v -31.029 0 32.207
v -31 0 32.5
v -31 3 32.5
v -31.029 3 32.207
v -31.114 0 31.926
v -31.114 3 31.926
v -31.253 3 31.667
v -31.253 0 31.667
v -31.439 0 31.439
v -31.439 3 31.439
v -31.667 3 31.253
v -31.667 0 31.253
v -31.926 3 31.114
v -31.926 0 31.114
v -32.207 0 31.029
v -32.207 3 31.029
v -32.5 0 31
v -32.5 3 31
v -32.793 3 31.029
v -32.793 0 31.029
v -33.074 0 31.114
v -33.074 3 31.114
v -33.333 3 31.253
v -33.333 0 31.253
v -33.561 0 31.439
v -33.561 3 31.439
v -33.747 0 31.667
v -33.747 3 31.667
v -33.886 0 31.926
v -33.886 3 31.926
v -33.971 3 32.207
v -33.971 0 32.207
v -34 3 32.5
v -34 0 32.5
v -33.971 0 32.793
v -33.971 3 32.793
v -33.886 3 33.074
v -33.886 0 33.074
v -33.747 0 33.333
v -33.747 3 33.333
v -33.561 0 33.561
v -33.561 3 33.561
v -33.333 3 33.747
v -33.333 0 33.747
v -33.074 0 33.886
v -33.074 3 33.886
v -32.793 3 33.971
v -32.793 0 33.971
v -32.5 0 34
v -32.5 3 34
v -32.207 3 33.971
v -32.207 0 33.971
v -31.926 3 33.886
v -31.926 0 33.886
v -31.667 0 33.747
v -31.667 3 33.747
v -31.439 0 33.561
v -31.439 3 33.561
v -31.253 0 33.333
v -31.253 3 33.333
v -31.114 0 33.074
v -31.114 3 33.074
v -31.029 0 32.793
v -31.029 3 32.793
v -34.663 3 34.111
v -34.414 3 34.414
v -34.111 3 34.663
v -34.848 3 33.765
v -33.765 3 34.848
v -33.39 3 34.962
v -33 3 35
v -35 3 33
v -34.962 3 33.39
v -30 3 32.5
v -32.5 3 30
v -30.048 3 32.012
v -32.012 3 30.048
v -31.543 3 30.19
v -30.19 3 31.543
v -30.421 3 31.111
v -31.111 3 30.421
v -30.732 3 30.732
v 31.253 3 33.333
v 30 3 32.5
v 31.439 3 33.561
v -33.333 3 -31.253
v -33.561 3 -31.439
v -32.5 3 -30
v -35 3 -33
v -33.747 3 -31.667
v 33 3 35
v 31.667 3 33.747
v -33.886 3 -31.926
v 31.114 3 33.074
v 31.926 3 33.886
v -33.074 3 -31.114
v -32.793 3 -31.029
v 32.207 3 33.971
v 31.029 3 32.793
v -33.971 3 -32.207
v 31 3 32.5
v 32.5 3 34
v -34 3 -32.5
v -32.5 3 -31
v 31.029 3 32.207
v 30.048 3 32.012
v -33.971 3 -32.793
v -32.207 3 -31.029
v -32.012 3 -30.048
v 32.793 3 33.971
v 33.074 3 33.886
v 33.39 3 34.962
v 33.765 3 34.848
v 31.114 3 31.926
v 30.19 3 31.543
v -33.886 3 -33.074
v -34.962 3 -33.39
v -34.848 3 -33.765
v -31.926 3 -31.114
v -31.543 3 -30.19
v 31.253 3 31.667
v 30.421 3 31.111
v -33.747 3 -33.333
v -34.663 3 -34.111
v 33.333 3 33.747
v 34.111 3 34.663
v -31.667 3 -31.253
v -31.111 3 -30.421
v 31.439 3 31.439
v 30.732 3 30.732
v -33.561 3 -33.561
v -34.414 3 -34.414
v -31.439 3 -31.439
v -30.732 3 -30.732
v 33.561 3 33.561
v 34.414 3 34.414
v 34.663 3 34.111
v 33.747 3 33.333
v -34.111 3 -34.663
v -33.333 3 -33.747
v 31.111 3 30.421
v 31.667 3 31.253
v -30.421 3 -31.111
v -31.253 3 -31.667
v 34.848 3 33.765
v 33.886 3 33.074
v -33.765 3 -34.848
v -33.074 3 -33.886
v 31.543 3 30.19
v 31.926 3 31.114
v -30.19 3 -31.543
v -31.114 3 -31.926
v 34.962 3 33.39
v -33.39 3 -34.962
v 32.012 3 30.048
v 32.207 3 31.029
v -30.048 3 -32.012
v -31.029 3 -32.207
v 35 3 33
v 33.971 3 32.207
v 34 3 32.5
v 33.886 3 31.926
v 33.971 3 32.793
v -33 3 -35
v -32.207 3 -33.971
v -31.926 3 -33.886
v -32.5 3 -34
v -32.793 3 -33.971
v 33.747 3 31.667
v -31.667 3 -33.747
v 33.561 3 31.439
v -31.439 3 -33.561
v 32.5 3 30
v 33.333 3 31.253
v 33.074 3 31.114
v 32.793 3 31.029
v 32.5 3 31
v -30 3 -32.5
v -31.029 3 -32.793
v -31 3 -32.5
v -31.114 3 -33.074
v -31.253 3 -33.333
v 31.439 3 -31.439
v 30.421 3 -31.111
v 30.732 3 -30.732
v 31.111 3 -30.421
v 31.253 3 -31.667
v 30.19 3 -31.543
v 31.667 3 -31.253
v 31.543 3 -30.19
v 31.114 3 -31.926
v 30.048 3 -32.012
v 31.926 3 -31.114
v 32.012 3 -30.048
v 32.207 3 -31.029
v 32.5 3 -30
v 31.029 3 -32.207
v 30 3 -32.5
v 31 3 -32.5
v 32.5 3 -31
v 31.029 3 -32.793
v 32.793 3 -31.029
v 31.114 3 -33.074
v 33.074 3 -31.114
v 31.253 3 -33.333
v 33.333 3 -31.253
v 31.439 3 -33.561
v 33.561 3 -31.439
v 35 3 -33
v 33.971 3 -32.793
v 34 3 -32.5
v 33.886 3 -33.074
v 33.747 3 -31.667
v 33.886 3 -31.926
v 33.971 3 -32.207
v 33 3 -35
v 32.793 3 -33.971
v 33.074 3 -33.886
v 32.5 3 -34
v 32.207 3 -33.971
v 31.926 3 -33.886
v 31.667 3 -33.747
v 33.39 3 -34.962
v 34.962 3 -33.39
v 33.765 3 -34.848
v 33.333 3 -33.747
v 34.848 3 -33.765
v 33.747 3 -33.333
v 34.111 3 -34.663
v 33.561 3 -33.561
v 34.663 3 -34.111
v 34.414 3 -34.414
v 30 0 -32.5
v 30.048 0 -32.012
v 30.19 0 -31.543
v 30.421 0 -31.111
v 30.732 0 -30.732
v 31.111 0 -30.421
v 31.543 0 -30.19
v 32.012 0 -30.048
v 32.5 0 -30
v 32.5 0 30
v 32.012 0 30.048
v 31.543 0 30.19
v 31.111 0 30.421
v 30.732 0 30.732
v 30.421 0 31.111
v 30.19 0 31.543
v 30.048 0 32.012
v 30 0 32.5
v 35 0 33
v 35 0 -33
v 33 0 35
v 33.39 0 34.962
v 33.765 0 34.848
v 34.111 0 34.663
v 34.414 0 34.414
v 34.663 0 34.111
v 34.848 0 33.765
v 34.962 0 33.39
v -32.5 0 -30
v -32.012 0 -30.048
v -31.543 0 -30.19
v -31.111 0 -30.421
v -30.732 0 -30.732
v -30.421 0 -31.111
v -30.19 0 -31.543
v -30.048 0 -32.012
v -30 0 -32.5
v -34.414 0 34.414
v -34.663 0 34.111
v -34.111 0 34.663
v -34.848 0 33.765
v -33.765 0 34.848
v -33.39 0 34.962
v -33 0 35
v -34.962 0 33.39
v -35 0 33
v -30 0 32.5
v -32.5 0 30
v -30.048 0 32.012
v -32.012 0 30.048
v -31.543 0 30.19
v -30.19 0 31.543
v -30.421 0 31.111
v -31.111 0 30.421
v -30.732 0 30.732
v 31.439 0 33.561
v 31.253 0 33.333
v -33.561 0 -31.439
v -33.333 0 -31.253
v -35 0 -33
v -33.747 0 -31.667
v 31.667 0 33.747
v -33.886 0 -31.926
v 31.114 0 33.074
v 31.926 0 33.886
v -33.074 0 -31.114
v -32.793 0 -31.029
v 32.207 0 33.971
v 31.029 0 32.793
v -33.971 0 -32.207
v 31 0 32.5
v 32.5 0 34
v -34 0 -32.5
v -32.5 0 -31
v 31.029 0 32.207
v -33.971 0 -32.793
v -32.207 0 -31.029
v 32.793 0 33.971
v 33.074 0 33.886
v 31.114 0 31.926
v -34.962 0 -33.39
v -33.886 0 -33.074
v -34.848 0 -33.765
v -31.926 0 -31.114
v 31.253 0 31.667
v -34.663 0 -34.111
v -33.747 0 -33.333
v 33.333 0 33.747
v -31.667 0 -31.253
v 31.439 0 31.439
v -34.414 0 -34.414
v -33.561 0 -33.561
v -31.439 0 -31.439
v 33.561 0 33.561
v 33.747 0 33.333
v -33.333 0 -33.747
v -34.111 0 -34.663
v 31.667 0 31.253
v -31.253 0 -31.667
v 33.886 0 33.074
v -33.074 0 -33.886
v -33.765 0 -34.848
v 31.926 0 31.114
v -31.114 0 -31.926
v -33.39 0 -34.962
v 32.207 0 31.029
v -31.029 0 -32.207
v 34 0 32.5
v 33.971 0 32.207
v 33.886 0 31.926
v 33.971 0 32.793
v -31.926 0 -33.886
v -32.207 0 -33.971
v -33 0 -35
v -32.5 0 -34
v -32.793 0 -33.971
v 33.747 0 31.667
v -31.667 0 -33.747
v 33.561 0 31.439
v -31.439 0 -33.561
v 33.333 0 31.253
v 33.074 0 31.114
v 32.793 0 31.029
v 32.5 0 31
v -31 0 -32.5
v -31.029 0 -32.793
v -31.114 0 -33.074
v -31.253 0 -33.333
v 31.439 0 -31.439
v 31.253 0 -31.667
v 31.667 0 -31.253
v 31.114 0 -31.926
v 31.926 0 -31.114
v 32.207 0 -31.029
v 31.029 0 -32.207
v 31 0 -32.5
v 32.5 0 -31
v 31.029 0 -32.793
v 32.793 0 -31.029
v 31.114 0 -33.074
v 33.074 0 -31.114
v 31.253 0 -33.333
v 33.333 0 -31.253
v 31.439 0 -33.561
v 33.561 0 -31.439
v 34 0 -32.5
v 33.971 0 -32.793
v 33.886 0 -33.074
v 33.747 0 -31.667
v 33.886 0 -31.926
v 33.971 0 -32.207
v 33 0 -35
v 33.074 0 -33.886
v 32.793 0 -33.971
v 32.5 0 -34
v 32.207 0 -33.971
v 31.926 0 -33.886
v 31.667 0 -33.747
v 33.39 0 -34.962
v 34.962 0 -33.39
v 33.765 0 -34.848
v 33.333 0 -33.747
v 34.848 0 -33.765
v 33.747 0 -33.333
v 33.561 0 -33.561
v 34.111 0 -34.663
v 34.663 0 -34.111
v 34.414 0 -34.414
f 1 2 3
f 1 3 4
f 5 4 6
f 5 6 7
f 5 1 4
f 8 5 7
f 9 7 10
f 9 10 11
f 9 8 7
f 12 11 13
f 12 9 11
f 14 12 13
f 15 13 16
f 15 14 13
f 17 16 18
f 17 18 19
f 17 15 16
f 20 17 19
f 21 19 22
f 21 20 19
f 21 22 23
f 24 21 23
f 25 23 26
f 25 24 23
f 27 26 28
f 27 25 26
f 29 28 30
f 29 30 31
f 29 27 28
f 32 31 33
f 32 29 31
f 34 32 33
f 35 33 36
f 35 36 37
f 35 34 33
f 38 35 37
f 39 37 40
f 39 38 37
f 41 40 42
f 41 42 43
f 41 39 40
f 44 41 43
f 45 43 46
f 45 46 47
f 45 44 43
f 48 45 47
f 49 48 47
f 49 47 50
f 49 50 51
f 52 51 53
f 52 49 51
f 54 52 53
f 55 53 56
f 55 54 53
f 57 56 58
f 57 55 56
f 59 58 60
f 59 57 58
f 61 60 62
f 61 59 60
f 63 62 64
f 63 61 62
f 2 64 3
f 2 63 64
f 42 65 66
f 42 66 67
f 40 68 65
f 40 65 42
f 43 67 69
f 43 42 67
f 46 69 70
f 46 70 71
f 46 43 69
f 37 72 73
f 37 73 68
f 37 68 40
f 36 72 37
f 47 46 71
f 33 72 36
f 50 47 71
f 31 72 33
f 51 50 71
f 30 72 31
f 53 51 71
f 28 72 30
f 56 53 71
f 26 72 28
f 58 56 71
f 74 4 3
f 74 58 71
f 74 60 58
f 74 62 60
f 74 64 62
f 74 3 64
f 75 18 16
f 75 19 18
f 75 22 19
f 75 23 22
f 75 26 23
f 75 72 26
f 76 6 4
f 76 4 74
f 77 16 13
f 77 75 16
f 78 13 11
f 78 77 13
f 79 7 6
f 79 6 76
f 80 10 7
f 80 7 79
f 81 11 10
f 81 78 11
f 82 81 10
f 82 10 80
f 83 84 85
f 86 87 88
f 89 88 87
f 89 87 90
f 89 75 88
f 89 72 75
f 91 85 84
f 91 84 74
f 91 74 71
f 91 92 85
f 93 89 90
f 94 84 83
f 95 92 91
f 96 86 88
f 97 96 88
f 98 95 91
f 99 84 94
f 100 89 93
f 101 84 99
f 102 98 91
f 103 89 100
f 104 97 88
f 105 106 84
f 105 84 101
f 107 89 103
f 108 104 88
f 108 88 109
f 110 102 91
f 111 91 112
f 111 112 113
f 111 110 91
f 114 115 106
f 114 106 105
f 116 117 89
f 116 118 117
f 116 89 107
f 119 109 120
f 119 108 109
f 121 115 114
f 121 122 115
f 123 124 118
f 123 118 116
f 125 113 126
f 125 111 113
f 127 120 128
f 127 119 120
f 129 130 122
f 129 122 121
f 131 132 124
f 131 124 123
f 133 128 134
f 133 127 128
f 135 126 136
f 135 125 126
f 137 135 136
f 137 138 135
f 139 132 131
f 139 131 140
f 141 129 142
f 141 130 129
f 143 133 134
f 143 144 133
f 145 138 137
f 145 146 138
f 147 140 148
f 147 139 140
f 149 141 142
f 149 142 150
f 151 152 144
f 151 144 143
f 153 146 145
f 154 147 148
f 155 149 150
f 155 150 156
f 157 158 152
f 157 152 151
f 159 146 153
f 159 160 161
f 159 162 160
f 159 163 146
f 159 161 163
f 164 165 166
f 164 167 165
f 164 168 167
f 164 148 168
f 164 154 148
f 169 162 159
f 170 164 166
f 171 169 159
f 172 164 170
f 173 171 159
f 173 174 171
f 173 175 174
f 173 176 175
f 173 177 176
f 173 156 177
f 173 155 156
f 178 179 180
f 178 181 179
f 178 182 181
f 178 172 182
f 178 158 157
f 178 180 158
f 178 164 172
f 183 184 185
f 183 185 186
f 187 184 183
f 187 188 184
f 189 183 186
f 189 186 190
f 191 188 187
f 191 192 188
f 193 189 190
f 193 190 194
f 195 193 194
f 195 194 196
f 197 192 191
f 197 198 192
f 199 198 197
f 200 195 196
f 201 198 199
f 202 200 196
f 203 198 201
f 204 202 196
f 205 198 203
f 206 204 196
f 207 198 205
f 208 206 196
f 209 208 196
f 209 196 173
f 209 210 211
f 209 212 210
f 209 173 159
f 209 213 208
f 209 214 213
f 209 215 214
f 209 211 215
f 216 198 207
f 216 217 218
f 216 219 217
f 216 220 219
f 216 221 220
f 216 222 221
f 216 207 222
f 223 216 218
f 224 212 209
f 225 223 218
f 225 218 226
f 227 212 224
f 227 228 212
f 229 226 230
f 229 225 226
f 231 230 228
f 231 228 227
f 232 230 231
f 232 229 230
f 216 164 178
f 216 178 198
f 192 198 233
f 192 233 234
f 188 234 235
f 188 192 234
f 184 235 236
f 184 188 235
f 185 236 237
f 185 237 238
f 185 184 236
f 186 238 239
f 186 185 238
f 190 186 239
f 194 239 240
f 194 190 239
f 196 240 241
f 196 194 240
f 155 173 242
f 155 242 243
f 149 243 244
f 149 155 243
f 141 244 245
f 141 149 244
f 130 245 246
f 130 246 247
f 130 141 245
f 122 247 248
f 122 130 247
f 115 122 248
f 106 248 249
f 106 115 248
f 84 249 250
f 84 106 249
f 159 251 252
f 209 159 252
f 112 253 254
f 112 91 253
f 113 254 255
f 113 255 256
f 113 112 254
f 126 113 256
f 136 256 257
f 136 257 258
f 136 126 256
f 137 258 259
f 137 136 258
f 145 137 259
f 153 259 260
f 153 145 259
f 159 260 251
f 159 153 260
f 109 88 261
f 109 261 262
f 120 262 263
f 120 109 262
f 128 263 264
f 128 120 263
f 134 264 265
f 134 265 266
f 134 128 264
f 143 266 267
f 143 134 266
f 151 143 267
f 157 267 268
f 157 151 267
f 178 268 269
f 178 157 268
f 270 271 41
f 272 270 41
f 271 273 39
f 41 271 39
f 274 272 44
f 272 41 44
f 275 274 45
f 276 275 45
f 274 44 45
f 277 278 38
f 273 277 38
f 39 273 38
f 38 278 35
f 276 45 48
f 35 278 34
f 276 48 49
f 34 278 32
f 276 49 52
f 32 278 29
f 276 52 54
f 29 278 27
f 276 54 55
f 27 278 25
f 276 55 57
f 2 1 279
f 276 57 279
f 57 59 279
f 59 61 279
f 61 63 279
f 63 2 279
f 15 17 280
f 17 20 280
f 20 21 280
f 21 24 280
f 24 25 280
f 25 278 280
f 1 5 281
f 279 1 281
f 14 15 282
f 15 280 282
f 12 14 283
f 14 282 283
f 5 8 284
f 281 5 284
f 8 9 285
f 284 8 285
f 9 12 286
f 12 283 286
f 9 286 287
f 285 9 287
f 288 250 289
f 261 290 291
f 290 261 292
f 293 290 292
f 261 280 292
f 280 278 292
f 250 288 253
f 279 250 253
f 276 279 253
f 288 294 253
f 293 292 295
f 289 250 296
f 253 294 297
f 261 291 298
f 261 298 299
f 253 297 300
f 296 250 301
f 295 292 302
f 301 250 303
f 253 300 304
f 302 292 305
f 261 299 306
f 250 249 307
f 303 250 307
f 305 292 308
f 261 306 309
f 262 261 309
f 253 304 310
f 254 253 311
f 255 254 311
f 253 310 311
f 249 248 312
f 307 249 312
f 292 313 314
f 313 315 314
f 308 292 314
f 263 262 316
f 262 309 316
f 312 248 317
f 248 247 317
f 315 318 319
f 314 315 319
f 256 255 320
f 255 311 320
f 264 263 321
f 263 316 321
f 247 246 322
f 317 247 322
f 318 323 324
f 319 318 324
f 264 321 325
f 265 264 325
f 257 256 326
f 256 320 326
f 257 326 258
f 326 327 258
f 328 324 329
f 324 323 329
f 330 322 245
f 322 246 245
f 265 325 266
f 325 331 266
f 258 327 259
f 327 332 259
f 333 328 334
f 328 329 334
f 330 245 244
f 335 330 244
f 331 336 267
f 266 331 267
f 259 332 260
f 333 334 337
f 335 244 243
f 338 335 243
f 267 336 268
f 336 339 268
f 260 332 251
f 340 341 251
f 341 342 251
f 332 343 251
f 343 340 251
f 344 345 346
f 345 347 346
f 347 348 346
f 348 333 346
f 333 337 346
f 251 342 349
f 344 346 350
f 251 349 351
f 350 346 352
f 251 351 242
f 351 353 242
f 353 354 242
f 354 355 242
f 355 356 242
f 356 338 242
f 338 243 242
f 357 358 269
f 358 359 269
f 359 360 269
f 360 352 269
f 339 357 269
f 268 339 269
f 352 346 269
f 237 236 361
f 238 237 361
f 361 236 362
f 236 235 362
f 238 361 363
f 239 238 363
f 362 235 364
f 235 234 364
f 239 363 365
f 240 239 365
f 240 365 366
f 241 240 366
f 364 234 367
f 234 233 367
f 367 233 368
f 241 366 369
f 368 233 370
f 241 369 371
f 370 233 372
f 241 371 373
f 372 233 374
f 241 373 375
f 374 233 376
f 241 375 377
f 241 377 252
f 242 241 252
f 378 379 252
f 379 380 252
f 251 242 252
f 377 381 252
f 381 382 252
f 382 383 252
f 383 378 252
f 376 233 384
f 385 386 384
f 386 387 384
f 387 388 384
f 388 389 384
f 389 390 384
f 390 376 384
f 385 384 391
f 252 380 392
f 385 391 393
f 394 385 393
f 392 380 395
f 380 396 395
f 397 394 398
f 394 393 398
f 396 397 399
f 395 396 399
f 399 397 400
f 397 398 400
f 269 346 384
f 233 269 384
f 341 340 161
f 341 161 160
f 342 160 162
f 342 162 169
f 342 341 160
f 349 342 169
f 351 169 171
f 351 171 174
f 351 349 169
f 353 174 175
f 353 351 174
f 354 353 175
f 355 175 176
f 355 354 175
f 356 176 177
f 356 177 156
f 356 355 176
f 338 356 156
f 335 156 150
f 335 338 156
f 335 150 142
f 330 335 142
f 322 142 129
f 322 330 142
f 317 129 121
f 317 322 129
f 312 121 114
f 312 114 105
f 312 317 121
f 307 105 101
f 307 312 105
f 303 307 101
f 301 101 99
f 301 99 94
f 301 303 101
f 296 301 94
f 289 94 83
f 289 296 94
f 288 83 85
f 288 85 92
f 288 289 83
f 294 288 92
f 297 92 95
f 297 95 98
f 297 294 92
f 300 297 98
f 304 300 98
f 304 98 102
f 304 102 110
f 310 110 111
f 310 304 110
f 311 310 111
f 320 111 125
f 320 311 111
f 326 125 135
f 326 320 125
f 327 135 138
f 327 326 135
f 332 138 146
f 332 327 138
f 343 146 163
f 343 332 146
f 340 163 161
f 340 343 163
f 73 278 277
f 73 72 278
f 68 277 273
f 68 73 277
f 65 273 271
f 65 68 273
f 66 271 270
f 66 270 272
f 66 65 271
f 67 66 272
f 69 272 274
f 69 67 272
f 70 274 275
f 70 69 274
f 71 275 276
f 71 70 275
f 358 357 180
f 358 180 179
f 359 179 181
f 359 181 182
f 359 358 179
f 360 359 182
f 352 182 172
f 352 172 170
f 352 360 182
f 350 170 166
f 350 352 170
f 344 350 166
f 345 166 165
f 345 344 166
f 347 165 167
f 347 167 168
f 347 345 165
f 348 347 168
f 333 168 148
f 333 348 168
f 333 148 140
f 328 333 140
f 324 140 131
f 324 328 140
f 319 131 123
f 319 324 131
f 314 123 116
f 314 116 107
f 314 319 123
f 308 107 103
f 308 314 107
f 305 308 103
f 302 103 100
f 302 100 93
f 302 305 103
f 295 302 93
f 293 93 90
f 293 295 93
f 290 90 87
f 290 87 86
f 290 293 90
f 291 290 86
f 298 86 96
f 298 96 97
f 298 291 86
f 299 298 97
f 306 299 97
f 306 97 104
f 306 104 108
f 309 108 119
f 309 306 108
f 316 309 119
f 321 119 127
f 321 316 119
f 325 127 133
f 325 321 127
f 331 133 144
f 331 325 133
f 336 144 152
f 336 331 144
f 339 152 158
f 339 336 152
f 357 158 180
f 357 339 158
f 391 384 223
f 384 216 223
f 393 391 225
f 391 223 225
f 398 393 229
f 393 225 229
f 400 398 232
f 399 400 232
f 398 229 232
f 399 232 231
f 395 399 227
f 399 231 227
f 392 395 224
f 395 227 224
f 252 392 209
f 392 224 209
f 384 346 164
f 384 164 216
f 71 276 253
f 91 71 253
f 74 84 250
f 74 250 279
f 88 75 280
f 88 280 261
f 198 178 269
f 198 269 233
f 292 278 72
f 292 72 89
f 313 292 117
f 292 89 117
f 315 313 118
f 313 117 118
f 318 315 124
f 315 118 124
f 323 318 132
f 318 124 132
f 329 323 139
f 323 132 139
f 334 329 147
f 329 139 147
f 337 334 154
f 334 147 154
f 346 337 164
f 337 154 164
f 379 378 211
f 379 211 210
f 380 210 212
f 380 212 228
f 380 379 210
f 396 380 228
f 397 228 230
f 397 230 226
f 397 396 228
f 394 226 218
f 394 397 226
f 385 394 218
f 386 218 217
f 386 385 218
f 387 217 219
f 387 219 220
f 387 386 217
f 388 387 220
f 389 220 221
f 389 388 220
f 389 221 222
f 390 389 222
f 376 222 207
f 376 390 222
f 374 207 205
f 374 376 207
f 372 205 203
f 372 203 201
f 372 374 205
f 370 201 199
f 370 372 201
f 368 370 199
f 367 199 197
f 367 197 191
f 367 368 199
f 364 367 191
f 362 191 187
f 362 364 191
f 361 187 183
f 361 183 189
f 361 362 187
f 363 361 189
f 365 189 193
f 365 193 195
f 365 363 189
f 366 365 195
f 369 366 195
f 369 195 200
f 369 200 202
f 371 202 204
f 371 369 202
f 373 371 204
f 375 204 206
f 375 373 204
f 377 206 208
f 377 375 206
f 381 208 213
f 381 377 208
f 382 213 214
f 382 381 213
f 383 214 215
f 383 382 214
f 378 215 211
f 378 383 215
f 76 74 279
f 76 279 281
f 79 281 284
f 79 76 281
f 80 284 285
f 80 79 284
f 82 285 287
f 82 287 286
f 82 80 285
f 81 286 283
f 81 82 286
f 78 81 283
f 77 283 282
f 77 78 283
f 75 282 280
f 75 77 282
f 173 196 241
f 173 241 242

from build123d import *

# Parameters (mm, degrees)
SKETCH1_W           = 70
SKETCH1_H           = 70
SKETCH1_R           = 1.5
BOSS_EXTRUDE1_DEPTH = 3
FILLET1_R           = 2
CUT_EXTRUDE1_DEPTH  = 4


with BuildPart() as part:
    # Sketch1 → Boss-Extrude1 (new body)
    with BuildSketch(Plane(origin=(0, 0, 0), x_dir=(1, 0, 0), z_dir=(0, 1, 0))):
        Rectangle(SKETCH1_W, SKETCH1_H)
        with Locations((-32.5, 32.5)):
            Circle(SKETCH1_R, mode=Mode.SUBTRACT)
        with Locations((32.5, 32.5)):
            Circle(SKETCH1_R, mode=Mode.SUBTRACT)
        with Locations((32.5, -32.5)):
            Circle(SKETCH1_R, mode=Mode.SUBTRACT)
        with Locations((-32.5, -32.5)):
            Circle(SKETCH1_R, mode=Mode.SUBTRACT)
    extrude(amount=BOSS_EXTRUDE1_DEPTH)

    # Fillet1
    fillet1_edges = [part.edges().sort_by_distance(p)[0] for p in [
        (35, 1.5, 35),
        (-35, 1.5, 35),
        (-35, 1.5, -35),
        (35, 1.5, -35),
    ]]
    fillet(fillet1_edges, radius=FILLET1_R)

    # Sketch2 → Cut-Extrude1 (cut, through all)
    with BuildSketch(Plane(origin=(0, 3, 0), x_dir=(1, 0, 0), z_dir=(0, 1, 0))):
        with BuildLine():
            Line((30, -32.5), (-30, -32.5))
            ThreePointArc((-30, -32.5), (-30.732233047, -30.732233047), (-32.5, -30))
            Line((-32.5, -30), (-32.5, 30))
            ThreePointArc((-32.5, 30), (-30.732233047, 30.732233047), (-30, 32.5))
            Line((-30, 32.5), (30, 32.5))
            ThreePointArc((30, 32.5), (30.732233047, 30.732233047), (32.5, 30))
            Line((32.5, 30), (32.5, -30))
            ThreePointArc((32.5, -30), (30.732233047, -30.732233047), (30, -32.5))
        make_face()
    extrude(amount=-CUT_EXTRUDE1_DEPTH, mode=Mode.SUBTRACT)


solid = part.part
